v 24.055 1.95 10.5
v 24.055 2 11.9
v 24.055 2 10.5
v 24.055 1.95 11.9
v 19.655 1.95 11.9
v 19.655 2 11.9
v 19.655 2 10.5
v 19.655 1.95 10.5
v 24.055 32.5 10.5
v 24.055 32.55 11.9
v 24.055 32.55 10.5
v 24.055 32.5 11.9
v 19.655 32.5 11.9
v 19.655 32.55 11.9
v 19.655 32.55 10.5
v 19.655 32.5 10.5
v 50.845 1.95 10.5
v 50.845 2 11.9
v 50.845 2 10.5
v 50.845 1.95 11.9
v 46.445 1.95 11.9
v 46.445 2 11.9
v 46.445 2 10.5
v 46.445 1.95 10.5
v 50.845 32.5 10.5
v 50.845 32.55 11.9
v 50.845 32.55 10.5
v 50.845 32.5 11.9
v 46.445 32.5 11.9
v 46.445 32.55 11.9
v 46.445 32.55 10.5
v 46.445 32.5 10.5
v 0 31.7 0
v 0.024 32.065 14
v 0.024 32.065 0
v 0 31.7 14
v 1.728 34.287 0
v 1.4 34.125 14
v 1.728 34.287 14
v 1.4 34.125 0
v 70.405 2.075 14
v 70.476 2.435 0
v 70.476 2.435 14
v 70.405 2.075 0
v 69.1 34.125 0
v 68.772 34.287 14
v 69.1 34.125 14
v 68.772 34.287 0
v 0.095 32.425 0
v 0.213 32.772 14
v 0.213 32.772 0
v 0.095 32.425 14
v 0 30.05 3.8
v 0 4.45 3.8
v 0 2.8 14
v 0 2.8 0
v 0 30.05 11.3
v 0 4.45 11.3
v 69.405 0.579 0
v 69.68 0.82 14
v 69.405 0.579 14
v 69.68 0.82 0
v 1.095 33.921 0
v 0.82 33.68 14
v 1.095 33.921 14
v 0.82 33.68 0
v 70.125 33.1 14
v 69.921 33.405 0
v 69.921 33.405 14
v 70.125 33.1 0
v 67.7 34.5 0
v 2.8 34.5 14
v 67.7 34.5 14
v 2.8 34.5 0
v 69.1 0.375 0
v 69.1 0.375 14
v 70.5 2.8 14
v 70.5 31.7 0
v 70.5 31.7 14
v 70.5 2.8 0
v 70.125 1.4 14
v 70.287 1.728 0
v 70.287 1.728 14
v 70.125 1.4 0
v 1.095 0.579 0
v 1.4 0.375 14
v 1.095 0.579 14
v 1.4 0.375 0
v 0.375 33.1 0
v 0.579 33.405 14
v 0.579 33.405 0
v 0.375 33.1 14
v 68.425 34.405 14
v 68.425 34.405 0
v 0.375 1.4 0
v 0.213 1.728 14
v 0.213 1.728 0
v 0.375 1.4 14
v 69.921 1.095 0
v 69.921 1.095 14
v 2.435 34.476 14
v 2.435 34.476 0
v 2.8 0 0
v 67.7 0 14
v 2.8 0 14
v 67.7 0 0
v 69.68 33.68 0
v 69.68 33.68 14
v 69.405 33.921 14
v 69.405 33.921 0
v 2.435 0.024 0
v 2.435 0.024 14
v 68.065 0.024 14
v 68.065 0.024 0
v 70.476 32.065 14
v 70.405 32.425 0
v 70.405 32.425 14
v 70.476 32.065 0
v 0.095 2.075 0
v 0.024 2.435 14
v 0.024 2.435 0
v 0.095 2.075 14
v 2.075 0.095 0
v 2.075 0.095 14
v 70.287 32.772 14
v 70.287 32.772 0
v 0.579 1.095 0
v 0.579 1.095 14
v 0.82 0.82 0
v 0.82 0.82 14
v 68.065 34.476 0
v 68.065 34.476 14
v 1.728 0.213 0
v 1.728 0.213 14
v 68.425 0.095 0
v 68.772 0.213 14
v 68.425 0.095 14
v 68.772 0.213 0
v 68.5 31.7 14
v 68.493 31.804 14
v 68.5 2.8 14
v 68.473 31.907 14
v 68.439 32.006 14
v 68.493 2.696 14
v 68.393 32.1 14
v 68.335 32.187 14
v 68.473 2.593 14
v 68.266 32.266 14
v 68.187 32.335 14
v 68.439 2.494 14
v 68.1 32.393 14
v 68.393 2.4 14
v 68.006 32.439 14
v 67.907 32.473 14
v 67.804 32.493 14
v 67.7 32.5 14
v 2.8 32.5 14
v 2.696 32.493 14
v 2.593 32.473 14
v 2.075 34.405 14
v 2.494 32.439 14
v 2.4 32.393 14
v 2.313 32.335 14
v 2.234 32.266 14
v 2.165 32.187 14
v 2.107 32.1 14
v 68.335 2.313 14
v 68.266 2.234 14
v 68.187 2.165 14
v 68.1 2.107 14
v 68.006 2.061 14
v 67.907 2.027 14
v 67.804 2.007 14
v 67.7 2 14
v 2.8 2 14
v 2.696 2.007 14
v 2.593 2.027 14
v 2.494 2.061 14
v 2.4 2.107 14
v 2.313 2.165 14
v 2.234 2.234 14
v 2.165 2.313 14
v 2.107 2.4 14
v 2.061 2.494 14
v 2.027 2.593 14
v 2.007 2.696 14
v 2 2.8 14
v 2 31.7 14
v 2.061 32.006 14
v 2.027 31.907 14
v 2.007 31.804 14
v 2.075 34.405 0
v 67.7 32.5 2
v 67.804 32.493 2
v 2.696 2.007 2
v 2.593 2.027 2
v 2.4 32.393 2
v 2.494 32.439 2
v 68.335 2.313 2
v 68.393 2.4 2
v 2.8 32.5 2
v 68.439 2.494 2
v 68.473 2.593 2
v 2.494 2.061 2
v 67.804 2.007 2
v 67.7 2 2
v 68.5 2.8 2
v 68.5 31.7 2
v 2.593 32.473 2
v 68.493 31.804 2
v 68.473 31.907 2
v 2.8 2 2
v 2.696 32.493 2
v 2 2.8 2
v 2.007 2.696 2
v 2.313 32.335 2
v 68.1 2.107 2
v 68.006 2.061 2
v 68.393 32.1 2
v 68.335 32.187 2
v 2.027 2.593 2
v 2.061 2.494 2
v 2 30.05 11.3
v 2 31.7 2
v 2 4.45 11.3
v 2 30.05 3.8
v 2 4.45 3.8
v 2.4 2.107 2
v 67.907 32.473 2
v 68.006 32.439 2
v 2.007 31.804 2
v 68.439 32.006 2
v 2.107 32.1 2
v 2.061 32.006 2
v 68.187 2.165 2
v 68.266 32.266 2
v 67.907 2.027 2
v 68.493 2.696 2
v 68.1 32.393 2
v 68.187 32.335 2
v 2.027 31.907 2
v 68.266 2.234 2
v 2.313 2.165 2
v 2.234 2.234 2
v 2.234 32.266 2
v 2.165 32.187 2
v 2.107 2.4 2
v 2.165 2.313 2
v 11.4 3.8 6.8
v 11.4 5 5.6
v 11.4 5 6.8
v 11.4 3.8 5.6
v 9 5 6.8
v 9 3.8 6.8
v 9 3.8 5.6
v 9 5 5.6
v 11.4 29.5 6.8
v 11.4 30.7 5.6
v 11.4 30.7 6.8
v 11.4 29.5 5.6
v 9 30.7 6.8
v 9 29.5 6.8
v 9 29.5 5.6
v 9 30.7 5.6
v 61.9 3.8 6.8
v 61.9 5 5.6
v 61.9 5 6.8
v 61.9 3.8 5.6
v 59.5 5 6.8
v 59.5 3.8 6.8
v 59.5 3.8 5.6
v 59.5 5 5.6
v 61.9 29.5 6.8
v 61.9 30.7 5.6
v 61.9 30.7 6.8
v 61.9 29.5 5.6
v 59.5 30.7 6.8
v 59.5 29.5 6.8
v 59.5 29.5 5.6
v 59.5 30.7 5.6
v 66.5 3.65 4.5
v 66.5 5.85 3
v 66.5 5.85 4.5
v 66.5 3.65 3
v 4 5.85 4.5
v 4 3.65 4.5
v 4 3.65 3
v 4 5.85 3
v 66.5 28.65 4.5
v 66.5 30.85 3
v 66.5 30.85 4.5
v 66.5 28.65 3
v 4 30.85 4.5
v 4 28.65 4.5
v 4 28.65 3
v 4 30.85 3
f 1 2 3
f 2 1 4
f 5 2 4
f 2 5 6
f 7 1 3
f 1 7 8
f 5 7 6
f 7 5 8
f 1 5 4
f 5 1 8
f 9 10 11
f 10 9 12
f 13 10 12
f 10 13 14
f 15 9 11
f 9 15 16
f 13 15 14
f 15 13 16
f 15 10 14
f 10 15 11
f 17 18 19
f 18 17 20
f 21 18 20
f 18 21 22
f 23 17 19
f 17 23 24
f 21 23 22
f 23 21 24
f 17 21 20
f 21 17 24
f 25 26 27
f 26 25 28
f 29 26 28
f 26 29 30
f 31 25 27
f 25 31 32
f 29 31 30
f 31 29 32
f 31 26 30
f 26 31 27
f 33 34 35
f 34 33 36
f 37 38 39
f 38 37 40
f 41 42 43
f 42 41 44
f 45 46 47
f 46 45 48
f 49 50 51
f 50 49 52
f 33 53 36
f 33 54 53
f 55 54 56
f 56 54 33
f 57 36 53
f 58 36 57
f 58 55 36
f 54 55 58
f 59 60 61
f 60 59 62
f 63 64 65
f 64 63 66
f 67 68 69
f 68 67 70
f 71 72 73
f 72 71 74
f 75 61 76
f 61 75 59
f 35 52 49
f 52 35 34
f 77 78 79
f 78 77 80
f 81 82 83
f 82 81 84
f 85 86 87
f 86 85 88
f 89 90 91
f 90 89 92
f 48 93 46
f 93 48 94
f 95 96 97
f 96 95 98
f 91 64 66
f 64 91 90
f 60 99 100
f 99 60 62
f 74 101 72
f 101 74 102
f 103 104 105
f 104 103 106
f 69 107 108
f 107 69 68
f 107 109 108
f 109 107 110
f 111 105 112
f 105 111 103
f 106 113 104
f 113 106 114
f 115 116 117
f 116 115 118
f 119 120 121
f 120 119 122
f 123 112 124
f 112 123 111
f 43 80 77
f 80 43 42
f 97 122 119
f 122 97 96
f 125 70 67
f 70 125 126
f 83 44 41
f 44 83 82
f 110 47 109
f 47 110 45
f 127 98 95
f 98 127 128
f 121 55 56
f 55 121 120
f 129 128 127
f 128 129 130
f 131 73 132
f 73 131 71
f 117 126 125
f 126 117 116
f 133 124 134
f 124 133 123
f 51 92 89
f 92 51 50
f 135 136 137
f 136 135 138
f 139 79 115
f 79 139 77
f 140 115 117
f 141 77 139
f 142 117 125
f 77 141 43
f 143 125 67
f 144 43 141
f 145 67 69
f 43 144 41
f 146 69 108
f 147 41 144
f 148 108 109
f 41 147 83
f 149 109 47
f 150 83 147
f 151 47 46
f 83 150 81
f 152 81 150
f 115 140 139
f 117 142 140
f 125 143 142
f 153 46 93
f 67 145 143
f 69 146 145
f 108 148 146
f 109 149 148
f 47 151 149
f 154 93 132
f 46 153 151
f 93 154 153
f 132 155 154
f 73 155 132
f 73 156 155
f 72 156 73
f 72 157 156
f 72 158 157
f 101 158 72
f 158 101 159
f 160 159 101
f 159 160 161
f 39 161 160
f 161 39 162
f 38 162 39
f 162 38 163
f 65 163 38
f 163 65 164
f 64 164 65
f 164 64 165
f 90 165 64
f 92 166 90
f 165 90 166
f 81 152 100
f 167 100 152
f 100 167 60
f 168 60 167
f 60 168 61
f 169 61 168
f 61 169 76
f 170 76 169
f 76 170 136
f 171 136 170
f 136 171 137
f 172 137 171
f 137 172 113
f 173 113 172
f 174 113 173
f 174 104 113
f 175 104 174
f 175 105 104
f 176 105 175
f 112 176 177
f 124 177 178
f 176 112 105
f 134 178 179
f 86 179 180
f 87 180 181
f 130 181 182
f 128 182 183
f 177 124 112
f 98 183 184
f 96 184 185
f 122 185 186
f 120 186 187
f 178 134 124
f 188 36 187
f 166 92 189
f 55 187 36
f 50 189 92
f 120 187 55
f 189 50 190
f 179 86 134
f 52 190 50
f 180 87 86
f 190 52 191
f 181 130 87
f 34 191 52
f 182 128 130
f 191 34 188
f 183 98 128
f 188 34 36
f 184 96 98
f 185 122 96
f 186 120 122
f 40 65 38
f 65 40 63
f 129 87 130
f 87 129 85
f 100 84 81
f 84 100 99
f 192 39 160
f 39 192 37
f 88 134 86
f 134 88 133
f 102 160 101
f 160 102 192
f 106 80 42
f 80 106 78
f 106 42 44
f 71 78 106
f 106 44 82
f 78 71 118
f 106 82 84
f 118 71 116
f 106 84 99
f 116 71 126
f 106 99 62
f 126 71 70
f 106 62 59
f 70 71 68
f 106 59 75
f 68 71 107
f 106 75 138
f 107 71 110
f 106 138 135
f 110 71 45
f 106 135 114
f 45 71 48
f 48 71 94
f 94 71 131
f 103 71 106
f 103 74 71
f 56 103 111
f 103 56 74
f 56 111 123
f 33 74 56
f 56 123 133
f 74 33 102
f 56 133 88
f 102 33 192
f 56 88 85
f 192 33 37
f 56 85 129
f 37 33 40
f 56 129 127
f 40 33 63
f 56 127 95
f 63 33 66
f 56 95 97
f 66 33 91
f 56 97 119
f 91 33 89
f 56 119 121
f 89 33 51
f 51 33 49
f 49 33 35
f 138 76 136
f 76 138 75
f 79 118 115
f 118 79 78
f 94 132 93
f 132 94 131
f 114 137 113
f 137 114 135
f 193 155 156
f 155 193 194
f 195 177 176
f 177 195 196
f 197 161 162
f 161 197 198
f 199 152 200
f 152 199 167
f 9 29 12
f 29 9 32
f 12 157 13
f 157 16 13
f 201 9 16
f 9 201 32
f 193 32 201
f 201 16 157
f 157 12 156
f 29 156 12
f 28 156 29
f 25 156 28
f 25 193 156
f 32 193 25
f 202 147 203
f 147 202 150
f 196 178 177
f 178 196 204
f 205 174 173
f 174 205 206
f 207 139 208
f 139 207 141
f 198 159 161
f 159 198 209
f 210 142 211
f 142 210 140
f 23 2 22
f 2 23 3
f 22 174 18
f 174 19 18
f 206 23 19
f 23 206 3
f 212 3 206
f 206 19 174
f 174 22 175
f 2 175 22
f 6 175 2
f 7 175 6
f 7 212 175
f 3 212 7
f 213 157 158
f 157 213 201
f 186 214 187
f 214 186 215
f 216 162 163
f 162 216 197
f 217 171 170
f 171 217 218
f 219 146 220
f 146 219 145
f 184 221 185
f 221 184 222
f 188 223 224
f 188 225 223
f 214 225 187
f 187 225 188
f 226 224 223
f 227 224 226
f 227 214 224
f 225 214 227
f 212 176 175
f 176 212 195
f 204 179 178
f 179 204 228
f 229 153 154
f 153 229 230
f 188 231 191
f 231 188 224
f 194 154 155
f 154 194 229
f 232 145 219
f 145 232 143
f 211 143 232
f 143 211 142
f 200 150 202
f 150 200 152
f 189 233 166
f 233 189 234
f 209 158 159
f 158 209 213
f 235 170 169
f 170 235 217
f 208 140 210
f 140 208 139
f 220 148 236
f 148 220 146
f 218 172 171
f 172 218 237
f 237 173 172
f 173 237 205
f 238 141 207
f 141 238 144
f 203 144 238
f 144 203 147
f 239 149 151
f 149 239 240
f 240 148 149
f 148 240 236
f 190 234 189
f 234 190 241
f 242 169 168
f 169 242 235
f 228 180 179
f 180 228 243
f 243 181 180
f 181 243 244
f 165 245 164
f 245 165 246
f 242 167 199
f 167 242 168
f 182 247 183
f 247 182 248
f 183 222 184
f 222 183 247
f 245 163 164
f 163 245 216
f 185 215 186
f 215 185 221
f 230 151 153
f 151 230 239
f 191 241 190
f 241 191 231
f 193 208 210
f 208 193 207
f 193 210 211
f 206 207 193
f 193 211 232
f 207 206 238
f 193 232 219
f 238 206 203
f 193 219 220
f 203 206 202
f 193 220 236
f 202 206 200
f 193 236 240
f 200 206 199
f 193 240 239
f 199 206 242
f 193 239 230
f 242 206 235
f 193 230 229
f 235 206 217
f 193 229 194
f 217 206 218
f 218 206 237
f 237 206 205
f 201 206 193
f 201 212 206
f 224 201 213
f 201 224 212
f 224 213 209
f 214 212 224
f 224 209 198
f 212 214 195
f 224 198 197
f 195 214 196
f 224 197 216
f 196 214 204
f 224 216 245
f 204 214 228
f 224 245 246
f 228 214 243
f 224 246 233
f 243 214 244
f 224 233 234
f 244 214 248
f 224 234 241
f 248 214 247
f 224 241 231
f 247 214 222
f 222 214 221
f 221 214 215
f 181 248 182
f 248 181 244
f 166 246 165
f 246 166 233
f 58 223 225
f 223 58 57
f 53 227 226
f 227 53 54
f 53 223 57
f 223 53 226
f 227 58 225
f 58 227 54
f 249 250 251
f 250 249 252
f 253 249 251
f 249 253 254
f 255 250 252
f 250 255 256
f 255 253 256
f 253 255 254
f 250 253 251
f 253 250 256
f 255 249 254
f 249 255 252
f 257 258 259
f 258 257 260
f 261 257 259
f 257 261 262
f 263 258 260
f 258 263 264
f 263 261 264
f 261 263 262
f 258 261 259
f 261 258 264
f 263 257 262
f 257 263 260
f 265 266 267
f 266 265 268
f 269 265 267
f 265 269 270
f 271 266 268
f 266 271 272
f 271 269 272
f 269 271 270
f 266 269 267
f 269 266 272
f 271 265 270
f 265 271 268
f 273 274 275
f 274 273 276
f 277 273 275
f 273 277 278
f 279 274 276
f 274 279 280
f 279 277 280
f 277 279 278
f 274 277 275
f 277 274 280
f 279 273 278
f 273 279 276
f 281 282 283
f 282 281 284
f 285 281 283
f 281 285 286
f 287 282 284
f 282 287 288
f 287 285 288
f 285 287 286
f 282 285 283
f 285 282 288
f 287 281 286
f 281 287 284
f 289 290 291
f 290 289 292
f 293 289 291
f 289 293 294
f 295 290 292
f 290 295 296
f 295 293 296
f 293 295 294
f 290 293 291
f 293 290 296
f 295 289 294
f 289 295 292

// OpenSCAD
// CynusLink ESP32-S3 gateway enclosure V4
// ESP32-S3 DevKitC-1 style board
// Screwless two-piece snap fit, enlarged internal clearance.
// Units: mm

$fn = 48;
part = "base"; // "base", "lid", or "preview"

// PCB reference dimensions
pcb_l = 62.8;
pcb_w = 25.4;
pcb_t = 1.6;

// V4: same enlarged enclosure as V3, without unused side openings.
// Internal cavity is 66.5 x 30.5 mm.
inner_l = 66.5;
inner_w = 30.5;
wall = 2.0;
floor_t = 2.0;
base_h = 14.0;
corner_r = 2.8;

outer_l = inner_l + 2*wall;
outer_w = inner_w + 2*wall;

lid_t = 2.2;
lid_skirt_h = 4.0;
lid_clear = 0.30;

module rounded_box(l,w,h,r){
    hull(){
        for(x=[r,l-r], y=[r,w-r])
            translate([x,y,0]) cylinder(r=r,h=h);
    }
}

module base_shell(){
    difference(){
        rounded_box(outer_l, outer_w, base_h, corner_r);

        // Open cavity.
        translate([wall,wall,floor_t])
            rounded_box(inner_l, inner_w, base_h, max(corner_r-wall,0.7));

        // Wide end opening for the DevKitC-1 USB connector area.
        // Extra width/height gives clone boards some tolerance.
        translate([-0.2, outer_w/2-12.8, 3.8])
            cube([wall+0.7,25.6,7.5]);

        // Four snap pockets, INSIDE the long walls.
        for(x=[outer_l*0.31, outer_l*0.69]){
            translate([x-2.2, wall-0.05, base_h-3.5])
                cube([4.4,1.25,1.40]);
            translate([x-2.2, outer_w-wall-1.20, base_h-3.5])
                cube([4.4,1.25,1.40]);
        }
    }

    // PCB edge rails. Their position is based on the PCB width rather than
    // the enlarged cavity width, so the wider enclosure cannot let the board fall through.
    rail_z = 3.0;
    rail_h = 1.5;
    rail_w = 2.2;
    overlap = 0.9;
    y_low = outer_w/2 - pcb_w/2 - overlap;
    y_high = outer_w/2 + pcb_w/2 - rail_w + overlap;

    translate([wall+2.0, y_low, rail_z])
        cube([inner_l-4.0, rail_w, rail_h]);
    translate([wall+2.0, y_high, rail_z])
        cube([inner_l-4.0, rail_w, rail_h]);

    // Small retainers above the PCB edge to reduce rattling.
    ret_z = rail_z + pcb_t + 1.0;
    for(x=[wall+7.0, outer_l-wall-9.0]){
        translate([x, y_low+0.15, ret_z]) cube([2.4,1.2,1.2]);
        translate([x, y_high+rail_w-1.35, ret_z]) cube([2.4,1.2,1.2]);
    }
}

module lid(){
    difference(){
        union(){
            // Top plate.
            rounded_box(outer_l, outer_w, lid_t, corner_r);

            // Internal locating skirt / lip. Interior is +Z.
            translate([wall-lid_clear, wall-lid_clear, lid_t])
            difference(){
                rounded_box(
                    inner_l+2*lid_clear,
                    inner_w+2*lid_clear,
                    lid_skirt_h,
                    max(corner_r-wall+0.35,0.9)
                );
                translate([1.30,1.30,-0.1])
                    rounded_box(
                        inner_l+2*lid_clear-2.60,
                        inner_w+2*lid_clear-2.60,
                        lid_skirt_h+0.2,
                        0.7
                    );
            }

            // Snap bumps that mate with the internal pockets in the base.
            for(x=[outer_l*0.31, outer_l*0.69]){
                translate([x-1.6, wall-lid_clear-0.42, lid_t+1.15])
                    cube([3.2,0.9,0.85]);
                translate([x-1.6, outer_w-wall+lid_clear-0.48, lid_t+1.15])
                    cube([3.2,0.9,0.85]);
            }
        }

        // Ventilation slots.
        for(i=[0:5])
            translate([outer_l-30+i*3.4, outer_w/2-7.0, -0.2])
                rounded_box(1.55,14.0,lid_t+0.4,0.6);

        // V3: engraved label on the OUTSIDE of the lid.
        // Exterior is the -Z face. Mirroring in X makes it readable when
        // looking at the exterior surface.
        translate([outer_l/2, outer_w/2, -0.05])
            linear_extrude(height=0.70)
                mirror([1,0,0])
                    text(
                        "CYNUS LINK",
                        size=5.4,
                        font="DejaVu Sans:style=Bold",
                        halign="center",
                        valign="center"
                    );
    }
}

if(part=="base") base_shell();
else if(part=="lid") lid();
else {
    color("gray") base_shell();
    translate([0,0,base_h+0.6]) color("lightgray") lid();
}
